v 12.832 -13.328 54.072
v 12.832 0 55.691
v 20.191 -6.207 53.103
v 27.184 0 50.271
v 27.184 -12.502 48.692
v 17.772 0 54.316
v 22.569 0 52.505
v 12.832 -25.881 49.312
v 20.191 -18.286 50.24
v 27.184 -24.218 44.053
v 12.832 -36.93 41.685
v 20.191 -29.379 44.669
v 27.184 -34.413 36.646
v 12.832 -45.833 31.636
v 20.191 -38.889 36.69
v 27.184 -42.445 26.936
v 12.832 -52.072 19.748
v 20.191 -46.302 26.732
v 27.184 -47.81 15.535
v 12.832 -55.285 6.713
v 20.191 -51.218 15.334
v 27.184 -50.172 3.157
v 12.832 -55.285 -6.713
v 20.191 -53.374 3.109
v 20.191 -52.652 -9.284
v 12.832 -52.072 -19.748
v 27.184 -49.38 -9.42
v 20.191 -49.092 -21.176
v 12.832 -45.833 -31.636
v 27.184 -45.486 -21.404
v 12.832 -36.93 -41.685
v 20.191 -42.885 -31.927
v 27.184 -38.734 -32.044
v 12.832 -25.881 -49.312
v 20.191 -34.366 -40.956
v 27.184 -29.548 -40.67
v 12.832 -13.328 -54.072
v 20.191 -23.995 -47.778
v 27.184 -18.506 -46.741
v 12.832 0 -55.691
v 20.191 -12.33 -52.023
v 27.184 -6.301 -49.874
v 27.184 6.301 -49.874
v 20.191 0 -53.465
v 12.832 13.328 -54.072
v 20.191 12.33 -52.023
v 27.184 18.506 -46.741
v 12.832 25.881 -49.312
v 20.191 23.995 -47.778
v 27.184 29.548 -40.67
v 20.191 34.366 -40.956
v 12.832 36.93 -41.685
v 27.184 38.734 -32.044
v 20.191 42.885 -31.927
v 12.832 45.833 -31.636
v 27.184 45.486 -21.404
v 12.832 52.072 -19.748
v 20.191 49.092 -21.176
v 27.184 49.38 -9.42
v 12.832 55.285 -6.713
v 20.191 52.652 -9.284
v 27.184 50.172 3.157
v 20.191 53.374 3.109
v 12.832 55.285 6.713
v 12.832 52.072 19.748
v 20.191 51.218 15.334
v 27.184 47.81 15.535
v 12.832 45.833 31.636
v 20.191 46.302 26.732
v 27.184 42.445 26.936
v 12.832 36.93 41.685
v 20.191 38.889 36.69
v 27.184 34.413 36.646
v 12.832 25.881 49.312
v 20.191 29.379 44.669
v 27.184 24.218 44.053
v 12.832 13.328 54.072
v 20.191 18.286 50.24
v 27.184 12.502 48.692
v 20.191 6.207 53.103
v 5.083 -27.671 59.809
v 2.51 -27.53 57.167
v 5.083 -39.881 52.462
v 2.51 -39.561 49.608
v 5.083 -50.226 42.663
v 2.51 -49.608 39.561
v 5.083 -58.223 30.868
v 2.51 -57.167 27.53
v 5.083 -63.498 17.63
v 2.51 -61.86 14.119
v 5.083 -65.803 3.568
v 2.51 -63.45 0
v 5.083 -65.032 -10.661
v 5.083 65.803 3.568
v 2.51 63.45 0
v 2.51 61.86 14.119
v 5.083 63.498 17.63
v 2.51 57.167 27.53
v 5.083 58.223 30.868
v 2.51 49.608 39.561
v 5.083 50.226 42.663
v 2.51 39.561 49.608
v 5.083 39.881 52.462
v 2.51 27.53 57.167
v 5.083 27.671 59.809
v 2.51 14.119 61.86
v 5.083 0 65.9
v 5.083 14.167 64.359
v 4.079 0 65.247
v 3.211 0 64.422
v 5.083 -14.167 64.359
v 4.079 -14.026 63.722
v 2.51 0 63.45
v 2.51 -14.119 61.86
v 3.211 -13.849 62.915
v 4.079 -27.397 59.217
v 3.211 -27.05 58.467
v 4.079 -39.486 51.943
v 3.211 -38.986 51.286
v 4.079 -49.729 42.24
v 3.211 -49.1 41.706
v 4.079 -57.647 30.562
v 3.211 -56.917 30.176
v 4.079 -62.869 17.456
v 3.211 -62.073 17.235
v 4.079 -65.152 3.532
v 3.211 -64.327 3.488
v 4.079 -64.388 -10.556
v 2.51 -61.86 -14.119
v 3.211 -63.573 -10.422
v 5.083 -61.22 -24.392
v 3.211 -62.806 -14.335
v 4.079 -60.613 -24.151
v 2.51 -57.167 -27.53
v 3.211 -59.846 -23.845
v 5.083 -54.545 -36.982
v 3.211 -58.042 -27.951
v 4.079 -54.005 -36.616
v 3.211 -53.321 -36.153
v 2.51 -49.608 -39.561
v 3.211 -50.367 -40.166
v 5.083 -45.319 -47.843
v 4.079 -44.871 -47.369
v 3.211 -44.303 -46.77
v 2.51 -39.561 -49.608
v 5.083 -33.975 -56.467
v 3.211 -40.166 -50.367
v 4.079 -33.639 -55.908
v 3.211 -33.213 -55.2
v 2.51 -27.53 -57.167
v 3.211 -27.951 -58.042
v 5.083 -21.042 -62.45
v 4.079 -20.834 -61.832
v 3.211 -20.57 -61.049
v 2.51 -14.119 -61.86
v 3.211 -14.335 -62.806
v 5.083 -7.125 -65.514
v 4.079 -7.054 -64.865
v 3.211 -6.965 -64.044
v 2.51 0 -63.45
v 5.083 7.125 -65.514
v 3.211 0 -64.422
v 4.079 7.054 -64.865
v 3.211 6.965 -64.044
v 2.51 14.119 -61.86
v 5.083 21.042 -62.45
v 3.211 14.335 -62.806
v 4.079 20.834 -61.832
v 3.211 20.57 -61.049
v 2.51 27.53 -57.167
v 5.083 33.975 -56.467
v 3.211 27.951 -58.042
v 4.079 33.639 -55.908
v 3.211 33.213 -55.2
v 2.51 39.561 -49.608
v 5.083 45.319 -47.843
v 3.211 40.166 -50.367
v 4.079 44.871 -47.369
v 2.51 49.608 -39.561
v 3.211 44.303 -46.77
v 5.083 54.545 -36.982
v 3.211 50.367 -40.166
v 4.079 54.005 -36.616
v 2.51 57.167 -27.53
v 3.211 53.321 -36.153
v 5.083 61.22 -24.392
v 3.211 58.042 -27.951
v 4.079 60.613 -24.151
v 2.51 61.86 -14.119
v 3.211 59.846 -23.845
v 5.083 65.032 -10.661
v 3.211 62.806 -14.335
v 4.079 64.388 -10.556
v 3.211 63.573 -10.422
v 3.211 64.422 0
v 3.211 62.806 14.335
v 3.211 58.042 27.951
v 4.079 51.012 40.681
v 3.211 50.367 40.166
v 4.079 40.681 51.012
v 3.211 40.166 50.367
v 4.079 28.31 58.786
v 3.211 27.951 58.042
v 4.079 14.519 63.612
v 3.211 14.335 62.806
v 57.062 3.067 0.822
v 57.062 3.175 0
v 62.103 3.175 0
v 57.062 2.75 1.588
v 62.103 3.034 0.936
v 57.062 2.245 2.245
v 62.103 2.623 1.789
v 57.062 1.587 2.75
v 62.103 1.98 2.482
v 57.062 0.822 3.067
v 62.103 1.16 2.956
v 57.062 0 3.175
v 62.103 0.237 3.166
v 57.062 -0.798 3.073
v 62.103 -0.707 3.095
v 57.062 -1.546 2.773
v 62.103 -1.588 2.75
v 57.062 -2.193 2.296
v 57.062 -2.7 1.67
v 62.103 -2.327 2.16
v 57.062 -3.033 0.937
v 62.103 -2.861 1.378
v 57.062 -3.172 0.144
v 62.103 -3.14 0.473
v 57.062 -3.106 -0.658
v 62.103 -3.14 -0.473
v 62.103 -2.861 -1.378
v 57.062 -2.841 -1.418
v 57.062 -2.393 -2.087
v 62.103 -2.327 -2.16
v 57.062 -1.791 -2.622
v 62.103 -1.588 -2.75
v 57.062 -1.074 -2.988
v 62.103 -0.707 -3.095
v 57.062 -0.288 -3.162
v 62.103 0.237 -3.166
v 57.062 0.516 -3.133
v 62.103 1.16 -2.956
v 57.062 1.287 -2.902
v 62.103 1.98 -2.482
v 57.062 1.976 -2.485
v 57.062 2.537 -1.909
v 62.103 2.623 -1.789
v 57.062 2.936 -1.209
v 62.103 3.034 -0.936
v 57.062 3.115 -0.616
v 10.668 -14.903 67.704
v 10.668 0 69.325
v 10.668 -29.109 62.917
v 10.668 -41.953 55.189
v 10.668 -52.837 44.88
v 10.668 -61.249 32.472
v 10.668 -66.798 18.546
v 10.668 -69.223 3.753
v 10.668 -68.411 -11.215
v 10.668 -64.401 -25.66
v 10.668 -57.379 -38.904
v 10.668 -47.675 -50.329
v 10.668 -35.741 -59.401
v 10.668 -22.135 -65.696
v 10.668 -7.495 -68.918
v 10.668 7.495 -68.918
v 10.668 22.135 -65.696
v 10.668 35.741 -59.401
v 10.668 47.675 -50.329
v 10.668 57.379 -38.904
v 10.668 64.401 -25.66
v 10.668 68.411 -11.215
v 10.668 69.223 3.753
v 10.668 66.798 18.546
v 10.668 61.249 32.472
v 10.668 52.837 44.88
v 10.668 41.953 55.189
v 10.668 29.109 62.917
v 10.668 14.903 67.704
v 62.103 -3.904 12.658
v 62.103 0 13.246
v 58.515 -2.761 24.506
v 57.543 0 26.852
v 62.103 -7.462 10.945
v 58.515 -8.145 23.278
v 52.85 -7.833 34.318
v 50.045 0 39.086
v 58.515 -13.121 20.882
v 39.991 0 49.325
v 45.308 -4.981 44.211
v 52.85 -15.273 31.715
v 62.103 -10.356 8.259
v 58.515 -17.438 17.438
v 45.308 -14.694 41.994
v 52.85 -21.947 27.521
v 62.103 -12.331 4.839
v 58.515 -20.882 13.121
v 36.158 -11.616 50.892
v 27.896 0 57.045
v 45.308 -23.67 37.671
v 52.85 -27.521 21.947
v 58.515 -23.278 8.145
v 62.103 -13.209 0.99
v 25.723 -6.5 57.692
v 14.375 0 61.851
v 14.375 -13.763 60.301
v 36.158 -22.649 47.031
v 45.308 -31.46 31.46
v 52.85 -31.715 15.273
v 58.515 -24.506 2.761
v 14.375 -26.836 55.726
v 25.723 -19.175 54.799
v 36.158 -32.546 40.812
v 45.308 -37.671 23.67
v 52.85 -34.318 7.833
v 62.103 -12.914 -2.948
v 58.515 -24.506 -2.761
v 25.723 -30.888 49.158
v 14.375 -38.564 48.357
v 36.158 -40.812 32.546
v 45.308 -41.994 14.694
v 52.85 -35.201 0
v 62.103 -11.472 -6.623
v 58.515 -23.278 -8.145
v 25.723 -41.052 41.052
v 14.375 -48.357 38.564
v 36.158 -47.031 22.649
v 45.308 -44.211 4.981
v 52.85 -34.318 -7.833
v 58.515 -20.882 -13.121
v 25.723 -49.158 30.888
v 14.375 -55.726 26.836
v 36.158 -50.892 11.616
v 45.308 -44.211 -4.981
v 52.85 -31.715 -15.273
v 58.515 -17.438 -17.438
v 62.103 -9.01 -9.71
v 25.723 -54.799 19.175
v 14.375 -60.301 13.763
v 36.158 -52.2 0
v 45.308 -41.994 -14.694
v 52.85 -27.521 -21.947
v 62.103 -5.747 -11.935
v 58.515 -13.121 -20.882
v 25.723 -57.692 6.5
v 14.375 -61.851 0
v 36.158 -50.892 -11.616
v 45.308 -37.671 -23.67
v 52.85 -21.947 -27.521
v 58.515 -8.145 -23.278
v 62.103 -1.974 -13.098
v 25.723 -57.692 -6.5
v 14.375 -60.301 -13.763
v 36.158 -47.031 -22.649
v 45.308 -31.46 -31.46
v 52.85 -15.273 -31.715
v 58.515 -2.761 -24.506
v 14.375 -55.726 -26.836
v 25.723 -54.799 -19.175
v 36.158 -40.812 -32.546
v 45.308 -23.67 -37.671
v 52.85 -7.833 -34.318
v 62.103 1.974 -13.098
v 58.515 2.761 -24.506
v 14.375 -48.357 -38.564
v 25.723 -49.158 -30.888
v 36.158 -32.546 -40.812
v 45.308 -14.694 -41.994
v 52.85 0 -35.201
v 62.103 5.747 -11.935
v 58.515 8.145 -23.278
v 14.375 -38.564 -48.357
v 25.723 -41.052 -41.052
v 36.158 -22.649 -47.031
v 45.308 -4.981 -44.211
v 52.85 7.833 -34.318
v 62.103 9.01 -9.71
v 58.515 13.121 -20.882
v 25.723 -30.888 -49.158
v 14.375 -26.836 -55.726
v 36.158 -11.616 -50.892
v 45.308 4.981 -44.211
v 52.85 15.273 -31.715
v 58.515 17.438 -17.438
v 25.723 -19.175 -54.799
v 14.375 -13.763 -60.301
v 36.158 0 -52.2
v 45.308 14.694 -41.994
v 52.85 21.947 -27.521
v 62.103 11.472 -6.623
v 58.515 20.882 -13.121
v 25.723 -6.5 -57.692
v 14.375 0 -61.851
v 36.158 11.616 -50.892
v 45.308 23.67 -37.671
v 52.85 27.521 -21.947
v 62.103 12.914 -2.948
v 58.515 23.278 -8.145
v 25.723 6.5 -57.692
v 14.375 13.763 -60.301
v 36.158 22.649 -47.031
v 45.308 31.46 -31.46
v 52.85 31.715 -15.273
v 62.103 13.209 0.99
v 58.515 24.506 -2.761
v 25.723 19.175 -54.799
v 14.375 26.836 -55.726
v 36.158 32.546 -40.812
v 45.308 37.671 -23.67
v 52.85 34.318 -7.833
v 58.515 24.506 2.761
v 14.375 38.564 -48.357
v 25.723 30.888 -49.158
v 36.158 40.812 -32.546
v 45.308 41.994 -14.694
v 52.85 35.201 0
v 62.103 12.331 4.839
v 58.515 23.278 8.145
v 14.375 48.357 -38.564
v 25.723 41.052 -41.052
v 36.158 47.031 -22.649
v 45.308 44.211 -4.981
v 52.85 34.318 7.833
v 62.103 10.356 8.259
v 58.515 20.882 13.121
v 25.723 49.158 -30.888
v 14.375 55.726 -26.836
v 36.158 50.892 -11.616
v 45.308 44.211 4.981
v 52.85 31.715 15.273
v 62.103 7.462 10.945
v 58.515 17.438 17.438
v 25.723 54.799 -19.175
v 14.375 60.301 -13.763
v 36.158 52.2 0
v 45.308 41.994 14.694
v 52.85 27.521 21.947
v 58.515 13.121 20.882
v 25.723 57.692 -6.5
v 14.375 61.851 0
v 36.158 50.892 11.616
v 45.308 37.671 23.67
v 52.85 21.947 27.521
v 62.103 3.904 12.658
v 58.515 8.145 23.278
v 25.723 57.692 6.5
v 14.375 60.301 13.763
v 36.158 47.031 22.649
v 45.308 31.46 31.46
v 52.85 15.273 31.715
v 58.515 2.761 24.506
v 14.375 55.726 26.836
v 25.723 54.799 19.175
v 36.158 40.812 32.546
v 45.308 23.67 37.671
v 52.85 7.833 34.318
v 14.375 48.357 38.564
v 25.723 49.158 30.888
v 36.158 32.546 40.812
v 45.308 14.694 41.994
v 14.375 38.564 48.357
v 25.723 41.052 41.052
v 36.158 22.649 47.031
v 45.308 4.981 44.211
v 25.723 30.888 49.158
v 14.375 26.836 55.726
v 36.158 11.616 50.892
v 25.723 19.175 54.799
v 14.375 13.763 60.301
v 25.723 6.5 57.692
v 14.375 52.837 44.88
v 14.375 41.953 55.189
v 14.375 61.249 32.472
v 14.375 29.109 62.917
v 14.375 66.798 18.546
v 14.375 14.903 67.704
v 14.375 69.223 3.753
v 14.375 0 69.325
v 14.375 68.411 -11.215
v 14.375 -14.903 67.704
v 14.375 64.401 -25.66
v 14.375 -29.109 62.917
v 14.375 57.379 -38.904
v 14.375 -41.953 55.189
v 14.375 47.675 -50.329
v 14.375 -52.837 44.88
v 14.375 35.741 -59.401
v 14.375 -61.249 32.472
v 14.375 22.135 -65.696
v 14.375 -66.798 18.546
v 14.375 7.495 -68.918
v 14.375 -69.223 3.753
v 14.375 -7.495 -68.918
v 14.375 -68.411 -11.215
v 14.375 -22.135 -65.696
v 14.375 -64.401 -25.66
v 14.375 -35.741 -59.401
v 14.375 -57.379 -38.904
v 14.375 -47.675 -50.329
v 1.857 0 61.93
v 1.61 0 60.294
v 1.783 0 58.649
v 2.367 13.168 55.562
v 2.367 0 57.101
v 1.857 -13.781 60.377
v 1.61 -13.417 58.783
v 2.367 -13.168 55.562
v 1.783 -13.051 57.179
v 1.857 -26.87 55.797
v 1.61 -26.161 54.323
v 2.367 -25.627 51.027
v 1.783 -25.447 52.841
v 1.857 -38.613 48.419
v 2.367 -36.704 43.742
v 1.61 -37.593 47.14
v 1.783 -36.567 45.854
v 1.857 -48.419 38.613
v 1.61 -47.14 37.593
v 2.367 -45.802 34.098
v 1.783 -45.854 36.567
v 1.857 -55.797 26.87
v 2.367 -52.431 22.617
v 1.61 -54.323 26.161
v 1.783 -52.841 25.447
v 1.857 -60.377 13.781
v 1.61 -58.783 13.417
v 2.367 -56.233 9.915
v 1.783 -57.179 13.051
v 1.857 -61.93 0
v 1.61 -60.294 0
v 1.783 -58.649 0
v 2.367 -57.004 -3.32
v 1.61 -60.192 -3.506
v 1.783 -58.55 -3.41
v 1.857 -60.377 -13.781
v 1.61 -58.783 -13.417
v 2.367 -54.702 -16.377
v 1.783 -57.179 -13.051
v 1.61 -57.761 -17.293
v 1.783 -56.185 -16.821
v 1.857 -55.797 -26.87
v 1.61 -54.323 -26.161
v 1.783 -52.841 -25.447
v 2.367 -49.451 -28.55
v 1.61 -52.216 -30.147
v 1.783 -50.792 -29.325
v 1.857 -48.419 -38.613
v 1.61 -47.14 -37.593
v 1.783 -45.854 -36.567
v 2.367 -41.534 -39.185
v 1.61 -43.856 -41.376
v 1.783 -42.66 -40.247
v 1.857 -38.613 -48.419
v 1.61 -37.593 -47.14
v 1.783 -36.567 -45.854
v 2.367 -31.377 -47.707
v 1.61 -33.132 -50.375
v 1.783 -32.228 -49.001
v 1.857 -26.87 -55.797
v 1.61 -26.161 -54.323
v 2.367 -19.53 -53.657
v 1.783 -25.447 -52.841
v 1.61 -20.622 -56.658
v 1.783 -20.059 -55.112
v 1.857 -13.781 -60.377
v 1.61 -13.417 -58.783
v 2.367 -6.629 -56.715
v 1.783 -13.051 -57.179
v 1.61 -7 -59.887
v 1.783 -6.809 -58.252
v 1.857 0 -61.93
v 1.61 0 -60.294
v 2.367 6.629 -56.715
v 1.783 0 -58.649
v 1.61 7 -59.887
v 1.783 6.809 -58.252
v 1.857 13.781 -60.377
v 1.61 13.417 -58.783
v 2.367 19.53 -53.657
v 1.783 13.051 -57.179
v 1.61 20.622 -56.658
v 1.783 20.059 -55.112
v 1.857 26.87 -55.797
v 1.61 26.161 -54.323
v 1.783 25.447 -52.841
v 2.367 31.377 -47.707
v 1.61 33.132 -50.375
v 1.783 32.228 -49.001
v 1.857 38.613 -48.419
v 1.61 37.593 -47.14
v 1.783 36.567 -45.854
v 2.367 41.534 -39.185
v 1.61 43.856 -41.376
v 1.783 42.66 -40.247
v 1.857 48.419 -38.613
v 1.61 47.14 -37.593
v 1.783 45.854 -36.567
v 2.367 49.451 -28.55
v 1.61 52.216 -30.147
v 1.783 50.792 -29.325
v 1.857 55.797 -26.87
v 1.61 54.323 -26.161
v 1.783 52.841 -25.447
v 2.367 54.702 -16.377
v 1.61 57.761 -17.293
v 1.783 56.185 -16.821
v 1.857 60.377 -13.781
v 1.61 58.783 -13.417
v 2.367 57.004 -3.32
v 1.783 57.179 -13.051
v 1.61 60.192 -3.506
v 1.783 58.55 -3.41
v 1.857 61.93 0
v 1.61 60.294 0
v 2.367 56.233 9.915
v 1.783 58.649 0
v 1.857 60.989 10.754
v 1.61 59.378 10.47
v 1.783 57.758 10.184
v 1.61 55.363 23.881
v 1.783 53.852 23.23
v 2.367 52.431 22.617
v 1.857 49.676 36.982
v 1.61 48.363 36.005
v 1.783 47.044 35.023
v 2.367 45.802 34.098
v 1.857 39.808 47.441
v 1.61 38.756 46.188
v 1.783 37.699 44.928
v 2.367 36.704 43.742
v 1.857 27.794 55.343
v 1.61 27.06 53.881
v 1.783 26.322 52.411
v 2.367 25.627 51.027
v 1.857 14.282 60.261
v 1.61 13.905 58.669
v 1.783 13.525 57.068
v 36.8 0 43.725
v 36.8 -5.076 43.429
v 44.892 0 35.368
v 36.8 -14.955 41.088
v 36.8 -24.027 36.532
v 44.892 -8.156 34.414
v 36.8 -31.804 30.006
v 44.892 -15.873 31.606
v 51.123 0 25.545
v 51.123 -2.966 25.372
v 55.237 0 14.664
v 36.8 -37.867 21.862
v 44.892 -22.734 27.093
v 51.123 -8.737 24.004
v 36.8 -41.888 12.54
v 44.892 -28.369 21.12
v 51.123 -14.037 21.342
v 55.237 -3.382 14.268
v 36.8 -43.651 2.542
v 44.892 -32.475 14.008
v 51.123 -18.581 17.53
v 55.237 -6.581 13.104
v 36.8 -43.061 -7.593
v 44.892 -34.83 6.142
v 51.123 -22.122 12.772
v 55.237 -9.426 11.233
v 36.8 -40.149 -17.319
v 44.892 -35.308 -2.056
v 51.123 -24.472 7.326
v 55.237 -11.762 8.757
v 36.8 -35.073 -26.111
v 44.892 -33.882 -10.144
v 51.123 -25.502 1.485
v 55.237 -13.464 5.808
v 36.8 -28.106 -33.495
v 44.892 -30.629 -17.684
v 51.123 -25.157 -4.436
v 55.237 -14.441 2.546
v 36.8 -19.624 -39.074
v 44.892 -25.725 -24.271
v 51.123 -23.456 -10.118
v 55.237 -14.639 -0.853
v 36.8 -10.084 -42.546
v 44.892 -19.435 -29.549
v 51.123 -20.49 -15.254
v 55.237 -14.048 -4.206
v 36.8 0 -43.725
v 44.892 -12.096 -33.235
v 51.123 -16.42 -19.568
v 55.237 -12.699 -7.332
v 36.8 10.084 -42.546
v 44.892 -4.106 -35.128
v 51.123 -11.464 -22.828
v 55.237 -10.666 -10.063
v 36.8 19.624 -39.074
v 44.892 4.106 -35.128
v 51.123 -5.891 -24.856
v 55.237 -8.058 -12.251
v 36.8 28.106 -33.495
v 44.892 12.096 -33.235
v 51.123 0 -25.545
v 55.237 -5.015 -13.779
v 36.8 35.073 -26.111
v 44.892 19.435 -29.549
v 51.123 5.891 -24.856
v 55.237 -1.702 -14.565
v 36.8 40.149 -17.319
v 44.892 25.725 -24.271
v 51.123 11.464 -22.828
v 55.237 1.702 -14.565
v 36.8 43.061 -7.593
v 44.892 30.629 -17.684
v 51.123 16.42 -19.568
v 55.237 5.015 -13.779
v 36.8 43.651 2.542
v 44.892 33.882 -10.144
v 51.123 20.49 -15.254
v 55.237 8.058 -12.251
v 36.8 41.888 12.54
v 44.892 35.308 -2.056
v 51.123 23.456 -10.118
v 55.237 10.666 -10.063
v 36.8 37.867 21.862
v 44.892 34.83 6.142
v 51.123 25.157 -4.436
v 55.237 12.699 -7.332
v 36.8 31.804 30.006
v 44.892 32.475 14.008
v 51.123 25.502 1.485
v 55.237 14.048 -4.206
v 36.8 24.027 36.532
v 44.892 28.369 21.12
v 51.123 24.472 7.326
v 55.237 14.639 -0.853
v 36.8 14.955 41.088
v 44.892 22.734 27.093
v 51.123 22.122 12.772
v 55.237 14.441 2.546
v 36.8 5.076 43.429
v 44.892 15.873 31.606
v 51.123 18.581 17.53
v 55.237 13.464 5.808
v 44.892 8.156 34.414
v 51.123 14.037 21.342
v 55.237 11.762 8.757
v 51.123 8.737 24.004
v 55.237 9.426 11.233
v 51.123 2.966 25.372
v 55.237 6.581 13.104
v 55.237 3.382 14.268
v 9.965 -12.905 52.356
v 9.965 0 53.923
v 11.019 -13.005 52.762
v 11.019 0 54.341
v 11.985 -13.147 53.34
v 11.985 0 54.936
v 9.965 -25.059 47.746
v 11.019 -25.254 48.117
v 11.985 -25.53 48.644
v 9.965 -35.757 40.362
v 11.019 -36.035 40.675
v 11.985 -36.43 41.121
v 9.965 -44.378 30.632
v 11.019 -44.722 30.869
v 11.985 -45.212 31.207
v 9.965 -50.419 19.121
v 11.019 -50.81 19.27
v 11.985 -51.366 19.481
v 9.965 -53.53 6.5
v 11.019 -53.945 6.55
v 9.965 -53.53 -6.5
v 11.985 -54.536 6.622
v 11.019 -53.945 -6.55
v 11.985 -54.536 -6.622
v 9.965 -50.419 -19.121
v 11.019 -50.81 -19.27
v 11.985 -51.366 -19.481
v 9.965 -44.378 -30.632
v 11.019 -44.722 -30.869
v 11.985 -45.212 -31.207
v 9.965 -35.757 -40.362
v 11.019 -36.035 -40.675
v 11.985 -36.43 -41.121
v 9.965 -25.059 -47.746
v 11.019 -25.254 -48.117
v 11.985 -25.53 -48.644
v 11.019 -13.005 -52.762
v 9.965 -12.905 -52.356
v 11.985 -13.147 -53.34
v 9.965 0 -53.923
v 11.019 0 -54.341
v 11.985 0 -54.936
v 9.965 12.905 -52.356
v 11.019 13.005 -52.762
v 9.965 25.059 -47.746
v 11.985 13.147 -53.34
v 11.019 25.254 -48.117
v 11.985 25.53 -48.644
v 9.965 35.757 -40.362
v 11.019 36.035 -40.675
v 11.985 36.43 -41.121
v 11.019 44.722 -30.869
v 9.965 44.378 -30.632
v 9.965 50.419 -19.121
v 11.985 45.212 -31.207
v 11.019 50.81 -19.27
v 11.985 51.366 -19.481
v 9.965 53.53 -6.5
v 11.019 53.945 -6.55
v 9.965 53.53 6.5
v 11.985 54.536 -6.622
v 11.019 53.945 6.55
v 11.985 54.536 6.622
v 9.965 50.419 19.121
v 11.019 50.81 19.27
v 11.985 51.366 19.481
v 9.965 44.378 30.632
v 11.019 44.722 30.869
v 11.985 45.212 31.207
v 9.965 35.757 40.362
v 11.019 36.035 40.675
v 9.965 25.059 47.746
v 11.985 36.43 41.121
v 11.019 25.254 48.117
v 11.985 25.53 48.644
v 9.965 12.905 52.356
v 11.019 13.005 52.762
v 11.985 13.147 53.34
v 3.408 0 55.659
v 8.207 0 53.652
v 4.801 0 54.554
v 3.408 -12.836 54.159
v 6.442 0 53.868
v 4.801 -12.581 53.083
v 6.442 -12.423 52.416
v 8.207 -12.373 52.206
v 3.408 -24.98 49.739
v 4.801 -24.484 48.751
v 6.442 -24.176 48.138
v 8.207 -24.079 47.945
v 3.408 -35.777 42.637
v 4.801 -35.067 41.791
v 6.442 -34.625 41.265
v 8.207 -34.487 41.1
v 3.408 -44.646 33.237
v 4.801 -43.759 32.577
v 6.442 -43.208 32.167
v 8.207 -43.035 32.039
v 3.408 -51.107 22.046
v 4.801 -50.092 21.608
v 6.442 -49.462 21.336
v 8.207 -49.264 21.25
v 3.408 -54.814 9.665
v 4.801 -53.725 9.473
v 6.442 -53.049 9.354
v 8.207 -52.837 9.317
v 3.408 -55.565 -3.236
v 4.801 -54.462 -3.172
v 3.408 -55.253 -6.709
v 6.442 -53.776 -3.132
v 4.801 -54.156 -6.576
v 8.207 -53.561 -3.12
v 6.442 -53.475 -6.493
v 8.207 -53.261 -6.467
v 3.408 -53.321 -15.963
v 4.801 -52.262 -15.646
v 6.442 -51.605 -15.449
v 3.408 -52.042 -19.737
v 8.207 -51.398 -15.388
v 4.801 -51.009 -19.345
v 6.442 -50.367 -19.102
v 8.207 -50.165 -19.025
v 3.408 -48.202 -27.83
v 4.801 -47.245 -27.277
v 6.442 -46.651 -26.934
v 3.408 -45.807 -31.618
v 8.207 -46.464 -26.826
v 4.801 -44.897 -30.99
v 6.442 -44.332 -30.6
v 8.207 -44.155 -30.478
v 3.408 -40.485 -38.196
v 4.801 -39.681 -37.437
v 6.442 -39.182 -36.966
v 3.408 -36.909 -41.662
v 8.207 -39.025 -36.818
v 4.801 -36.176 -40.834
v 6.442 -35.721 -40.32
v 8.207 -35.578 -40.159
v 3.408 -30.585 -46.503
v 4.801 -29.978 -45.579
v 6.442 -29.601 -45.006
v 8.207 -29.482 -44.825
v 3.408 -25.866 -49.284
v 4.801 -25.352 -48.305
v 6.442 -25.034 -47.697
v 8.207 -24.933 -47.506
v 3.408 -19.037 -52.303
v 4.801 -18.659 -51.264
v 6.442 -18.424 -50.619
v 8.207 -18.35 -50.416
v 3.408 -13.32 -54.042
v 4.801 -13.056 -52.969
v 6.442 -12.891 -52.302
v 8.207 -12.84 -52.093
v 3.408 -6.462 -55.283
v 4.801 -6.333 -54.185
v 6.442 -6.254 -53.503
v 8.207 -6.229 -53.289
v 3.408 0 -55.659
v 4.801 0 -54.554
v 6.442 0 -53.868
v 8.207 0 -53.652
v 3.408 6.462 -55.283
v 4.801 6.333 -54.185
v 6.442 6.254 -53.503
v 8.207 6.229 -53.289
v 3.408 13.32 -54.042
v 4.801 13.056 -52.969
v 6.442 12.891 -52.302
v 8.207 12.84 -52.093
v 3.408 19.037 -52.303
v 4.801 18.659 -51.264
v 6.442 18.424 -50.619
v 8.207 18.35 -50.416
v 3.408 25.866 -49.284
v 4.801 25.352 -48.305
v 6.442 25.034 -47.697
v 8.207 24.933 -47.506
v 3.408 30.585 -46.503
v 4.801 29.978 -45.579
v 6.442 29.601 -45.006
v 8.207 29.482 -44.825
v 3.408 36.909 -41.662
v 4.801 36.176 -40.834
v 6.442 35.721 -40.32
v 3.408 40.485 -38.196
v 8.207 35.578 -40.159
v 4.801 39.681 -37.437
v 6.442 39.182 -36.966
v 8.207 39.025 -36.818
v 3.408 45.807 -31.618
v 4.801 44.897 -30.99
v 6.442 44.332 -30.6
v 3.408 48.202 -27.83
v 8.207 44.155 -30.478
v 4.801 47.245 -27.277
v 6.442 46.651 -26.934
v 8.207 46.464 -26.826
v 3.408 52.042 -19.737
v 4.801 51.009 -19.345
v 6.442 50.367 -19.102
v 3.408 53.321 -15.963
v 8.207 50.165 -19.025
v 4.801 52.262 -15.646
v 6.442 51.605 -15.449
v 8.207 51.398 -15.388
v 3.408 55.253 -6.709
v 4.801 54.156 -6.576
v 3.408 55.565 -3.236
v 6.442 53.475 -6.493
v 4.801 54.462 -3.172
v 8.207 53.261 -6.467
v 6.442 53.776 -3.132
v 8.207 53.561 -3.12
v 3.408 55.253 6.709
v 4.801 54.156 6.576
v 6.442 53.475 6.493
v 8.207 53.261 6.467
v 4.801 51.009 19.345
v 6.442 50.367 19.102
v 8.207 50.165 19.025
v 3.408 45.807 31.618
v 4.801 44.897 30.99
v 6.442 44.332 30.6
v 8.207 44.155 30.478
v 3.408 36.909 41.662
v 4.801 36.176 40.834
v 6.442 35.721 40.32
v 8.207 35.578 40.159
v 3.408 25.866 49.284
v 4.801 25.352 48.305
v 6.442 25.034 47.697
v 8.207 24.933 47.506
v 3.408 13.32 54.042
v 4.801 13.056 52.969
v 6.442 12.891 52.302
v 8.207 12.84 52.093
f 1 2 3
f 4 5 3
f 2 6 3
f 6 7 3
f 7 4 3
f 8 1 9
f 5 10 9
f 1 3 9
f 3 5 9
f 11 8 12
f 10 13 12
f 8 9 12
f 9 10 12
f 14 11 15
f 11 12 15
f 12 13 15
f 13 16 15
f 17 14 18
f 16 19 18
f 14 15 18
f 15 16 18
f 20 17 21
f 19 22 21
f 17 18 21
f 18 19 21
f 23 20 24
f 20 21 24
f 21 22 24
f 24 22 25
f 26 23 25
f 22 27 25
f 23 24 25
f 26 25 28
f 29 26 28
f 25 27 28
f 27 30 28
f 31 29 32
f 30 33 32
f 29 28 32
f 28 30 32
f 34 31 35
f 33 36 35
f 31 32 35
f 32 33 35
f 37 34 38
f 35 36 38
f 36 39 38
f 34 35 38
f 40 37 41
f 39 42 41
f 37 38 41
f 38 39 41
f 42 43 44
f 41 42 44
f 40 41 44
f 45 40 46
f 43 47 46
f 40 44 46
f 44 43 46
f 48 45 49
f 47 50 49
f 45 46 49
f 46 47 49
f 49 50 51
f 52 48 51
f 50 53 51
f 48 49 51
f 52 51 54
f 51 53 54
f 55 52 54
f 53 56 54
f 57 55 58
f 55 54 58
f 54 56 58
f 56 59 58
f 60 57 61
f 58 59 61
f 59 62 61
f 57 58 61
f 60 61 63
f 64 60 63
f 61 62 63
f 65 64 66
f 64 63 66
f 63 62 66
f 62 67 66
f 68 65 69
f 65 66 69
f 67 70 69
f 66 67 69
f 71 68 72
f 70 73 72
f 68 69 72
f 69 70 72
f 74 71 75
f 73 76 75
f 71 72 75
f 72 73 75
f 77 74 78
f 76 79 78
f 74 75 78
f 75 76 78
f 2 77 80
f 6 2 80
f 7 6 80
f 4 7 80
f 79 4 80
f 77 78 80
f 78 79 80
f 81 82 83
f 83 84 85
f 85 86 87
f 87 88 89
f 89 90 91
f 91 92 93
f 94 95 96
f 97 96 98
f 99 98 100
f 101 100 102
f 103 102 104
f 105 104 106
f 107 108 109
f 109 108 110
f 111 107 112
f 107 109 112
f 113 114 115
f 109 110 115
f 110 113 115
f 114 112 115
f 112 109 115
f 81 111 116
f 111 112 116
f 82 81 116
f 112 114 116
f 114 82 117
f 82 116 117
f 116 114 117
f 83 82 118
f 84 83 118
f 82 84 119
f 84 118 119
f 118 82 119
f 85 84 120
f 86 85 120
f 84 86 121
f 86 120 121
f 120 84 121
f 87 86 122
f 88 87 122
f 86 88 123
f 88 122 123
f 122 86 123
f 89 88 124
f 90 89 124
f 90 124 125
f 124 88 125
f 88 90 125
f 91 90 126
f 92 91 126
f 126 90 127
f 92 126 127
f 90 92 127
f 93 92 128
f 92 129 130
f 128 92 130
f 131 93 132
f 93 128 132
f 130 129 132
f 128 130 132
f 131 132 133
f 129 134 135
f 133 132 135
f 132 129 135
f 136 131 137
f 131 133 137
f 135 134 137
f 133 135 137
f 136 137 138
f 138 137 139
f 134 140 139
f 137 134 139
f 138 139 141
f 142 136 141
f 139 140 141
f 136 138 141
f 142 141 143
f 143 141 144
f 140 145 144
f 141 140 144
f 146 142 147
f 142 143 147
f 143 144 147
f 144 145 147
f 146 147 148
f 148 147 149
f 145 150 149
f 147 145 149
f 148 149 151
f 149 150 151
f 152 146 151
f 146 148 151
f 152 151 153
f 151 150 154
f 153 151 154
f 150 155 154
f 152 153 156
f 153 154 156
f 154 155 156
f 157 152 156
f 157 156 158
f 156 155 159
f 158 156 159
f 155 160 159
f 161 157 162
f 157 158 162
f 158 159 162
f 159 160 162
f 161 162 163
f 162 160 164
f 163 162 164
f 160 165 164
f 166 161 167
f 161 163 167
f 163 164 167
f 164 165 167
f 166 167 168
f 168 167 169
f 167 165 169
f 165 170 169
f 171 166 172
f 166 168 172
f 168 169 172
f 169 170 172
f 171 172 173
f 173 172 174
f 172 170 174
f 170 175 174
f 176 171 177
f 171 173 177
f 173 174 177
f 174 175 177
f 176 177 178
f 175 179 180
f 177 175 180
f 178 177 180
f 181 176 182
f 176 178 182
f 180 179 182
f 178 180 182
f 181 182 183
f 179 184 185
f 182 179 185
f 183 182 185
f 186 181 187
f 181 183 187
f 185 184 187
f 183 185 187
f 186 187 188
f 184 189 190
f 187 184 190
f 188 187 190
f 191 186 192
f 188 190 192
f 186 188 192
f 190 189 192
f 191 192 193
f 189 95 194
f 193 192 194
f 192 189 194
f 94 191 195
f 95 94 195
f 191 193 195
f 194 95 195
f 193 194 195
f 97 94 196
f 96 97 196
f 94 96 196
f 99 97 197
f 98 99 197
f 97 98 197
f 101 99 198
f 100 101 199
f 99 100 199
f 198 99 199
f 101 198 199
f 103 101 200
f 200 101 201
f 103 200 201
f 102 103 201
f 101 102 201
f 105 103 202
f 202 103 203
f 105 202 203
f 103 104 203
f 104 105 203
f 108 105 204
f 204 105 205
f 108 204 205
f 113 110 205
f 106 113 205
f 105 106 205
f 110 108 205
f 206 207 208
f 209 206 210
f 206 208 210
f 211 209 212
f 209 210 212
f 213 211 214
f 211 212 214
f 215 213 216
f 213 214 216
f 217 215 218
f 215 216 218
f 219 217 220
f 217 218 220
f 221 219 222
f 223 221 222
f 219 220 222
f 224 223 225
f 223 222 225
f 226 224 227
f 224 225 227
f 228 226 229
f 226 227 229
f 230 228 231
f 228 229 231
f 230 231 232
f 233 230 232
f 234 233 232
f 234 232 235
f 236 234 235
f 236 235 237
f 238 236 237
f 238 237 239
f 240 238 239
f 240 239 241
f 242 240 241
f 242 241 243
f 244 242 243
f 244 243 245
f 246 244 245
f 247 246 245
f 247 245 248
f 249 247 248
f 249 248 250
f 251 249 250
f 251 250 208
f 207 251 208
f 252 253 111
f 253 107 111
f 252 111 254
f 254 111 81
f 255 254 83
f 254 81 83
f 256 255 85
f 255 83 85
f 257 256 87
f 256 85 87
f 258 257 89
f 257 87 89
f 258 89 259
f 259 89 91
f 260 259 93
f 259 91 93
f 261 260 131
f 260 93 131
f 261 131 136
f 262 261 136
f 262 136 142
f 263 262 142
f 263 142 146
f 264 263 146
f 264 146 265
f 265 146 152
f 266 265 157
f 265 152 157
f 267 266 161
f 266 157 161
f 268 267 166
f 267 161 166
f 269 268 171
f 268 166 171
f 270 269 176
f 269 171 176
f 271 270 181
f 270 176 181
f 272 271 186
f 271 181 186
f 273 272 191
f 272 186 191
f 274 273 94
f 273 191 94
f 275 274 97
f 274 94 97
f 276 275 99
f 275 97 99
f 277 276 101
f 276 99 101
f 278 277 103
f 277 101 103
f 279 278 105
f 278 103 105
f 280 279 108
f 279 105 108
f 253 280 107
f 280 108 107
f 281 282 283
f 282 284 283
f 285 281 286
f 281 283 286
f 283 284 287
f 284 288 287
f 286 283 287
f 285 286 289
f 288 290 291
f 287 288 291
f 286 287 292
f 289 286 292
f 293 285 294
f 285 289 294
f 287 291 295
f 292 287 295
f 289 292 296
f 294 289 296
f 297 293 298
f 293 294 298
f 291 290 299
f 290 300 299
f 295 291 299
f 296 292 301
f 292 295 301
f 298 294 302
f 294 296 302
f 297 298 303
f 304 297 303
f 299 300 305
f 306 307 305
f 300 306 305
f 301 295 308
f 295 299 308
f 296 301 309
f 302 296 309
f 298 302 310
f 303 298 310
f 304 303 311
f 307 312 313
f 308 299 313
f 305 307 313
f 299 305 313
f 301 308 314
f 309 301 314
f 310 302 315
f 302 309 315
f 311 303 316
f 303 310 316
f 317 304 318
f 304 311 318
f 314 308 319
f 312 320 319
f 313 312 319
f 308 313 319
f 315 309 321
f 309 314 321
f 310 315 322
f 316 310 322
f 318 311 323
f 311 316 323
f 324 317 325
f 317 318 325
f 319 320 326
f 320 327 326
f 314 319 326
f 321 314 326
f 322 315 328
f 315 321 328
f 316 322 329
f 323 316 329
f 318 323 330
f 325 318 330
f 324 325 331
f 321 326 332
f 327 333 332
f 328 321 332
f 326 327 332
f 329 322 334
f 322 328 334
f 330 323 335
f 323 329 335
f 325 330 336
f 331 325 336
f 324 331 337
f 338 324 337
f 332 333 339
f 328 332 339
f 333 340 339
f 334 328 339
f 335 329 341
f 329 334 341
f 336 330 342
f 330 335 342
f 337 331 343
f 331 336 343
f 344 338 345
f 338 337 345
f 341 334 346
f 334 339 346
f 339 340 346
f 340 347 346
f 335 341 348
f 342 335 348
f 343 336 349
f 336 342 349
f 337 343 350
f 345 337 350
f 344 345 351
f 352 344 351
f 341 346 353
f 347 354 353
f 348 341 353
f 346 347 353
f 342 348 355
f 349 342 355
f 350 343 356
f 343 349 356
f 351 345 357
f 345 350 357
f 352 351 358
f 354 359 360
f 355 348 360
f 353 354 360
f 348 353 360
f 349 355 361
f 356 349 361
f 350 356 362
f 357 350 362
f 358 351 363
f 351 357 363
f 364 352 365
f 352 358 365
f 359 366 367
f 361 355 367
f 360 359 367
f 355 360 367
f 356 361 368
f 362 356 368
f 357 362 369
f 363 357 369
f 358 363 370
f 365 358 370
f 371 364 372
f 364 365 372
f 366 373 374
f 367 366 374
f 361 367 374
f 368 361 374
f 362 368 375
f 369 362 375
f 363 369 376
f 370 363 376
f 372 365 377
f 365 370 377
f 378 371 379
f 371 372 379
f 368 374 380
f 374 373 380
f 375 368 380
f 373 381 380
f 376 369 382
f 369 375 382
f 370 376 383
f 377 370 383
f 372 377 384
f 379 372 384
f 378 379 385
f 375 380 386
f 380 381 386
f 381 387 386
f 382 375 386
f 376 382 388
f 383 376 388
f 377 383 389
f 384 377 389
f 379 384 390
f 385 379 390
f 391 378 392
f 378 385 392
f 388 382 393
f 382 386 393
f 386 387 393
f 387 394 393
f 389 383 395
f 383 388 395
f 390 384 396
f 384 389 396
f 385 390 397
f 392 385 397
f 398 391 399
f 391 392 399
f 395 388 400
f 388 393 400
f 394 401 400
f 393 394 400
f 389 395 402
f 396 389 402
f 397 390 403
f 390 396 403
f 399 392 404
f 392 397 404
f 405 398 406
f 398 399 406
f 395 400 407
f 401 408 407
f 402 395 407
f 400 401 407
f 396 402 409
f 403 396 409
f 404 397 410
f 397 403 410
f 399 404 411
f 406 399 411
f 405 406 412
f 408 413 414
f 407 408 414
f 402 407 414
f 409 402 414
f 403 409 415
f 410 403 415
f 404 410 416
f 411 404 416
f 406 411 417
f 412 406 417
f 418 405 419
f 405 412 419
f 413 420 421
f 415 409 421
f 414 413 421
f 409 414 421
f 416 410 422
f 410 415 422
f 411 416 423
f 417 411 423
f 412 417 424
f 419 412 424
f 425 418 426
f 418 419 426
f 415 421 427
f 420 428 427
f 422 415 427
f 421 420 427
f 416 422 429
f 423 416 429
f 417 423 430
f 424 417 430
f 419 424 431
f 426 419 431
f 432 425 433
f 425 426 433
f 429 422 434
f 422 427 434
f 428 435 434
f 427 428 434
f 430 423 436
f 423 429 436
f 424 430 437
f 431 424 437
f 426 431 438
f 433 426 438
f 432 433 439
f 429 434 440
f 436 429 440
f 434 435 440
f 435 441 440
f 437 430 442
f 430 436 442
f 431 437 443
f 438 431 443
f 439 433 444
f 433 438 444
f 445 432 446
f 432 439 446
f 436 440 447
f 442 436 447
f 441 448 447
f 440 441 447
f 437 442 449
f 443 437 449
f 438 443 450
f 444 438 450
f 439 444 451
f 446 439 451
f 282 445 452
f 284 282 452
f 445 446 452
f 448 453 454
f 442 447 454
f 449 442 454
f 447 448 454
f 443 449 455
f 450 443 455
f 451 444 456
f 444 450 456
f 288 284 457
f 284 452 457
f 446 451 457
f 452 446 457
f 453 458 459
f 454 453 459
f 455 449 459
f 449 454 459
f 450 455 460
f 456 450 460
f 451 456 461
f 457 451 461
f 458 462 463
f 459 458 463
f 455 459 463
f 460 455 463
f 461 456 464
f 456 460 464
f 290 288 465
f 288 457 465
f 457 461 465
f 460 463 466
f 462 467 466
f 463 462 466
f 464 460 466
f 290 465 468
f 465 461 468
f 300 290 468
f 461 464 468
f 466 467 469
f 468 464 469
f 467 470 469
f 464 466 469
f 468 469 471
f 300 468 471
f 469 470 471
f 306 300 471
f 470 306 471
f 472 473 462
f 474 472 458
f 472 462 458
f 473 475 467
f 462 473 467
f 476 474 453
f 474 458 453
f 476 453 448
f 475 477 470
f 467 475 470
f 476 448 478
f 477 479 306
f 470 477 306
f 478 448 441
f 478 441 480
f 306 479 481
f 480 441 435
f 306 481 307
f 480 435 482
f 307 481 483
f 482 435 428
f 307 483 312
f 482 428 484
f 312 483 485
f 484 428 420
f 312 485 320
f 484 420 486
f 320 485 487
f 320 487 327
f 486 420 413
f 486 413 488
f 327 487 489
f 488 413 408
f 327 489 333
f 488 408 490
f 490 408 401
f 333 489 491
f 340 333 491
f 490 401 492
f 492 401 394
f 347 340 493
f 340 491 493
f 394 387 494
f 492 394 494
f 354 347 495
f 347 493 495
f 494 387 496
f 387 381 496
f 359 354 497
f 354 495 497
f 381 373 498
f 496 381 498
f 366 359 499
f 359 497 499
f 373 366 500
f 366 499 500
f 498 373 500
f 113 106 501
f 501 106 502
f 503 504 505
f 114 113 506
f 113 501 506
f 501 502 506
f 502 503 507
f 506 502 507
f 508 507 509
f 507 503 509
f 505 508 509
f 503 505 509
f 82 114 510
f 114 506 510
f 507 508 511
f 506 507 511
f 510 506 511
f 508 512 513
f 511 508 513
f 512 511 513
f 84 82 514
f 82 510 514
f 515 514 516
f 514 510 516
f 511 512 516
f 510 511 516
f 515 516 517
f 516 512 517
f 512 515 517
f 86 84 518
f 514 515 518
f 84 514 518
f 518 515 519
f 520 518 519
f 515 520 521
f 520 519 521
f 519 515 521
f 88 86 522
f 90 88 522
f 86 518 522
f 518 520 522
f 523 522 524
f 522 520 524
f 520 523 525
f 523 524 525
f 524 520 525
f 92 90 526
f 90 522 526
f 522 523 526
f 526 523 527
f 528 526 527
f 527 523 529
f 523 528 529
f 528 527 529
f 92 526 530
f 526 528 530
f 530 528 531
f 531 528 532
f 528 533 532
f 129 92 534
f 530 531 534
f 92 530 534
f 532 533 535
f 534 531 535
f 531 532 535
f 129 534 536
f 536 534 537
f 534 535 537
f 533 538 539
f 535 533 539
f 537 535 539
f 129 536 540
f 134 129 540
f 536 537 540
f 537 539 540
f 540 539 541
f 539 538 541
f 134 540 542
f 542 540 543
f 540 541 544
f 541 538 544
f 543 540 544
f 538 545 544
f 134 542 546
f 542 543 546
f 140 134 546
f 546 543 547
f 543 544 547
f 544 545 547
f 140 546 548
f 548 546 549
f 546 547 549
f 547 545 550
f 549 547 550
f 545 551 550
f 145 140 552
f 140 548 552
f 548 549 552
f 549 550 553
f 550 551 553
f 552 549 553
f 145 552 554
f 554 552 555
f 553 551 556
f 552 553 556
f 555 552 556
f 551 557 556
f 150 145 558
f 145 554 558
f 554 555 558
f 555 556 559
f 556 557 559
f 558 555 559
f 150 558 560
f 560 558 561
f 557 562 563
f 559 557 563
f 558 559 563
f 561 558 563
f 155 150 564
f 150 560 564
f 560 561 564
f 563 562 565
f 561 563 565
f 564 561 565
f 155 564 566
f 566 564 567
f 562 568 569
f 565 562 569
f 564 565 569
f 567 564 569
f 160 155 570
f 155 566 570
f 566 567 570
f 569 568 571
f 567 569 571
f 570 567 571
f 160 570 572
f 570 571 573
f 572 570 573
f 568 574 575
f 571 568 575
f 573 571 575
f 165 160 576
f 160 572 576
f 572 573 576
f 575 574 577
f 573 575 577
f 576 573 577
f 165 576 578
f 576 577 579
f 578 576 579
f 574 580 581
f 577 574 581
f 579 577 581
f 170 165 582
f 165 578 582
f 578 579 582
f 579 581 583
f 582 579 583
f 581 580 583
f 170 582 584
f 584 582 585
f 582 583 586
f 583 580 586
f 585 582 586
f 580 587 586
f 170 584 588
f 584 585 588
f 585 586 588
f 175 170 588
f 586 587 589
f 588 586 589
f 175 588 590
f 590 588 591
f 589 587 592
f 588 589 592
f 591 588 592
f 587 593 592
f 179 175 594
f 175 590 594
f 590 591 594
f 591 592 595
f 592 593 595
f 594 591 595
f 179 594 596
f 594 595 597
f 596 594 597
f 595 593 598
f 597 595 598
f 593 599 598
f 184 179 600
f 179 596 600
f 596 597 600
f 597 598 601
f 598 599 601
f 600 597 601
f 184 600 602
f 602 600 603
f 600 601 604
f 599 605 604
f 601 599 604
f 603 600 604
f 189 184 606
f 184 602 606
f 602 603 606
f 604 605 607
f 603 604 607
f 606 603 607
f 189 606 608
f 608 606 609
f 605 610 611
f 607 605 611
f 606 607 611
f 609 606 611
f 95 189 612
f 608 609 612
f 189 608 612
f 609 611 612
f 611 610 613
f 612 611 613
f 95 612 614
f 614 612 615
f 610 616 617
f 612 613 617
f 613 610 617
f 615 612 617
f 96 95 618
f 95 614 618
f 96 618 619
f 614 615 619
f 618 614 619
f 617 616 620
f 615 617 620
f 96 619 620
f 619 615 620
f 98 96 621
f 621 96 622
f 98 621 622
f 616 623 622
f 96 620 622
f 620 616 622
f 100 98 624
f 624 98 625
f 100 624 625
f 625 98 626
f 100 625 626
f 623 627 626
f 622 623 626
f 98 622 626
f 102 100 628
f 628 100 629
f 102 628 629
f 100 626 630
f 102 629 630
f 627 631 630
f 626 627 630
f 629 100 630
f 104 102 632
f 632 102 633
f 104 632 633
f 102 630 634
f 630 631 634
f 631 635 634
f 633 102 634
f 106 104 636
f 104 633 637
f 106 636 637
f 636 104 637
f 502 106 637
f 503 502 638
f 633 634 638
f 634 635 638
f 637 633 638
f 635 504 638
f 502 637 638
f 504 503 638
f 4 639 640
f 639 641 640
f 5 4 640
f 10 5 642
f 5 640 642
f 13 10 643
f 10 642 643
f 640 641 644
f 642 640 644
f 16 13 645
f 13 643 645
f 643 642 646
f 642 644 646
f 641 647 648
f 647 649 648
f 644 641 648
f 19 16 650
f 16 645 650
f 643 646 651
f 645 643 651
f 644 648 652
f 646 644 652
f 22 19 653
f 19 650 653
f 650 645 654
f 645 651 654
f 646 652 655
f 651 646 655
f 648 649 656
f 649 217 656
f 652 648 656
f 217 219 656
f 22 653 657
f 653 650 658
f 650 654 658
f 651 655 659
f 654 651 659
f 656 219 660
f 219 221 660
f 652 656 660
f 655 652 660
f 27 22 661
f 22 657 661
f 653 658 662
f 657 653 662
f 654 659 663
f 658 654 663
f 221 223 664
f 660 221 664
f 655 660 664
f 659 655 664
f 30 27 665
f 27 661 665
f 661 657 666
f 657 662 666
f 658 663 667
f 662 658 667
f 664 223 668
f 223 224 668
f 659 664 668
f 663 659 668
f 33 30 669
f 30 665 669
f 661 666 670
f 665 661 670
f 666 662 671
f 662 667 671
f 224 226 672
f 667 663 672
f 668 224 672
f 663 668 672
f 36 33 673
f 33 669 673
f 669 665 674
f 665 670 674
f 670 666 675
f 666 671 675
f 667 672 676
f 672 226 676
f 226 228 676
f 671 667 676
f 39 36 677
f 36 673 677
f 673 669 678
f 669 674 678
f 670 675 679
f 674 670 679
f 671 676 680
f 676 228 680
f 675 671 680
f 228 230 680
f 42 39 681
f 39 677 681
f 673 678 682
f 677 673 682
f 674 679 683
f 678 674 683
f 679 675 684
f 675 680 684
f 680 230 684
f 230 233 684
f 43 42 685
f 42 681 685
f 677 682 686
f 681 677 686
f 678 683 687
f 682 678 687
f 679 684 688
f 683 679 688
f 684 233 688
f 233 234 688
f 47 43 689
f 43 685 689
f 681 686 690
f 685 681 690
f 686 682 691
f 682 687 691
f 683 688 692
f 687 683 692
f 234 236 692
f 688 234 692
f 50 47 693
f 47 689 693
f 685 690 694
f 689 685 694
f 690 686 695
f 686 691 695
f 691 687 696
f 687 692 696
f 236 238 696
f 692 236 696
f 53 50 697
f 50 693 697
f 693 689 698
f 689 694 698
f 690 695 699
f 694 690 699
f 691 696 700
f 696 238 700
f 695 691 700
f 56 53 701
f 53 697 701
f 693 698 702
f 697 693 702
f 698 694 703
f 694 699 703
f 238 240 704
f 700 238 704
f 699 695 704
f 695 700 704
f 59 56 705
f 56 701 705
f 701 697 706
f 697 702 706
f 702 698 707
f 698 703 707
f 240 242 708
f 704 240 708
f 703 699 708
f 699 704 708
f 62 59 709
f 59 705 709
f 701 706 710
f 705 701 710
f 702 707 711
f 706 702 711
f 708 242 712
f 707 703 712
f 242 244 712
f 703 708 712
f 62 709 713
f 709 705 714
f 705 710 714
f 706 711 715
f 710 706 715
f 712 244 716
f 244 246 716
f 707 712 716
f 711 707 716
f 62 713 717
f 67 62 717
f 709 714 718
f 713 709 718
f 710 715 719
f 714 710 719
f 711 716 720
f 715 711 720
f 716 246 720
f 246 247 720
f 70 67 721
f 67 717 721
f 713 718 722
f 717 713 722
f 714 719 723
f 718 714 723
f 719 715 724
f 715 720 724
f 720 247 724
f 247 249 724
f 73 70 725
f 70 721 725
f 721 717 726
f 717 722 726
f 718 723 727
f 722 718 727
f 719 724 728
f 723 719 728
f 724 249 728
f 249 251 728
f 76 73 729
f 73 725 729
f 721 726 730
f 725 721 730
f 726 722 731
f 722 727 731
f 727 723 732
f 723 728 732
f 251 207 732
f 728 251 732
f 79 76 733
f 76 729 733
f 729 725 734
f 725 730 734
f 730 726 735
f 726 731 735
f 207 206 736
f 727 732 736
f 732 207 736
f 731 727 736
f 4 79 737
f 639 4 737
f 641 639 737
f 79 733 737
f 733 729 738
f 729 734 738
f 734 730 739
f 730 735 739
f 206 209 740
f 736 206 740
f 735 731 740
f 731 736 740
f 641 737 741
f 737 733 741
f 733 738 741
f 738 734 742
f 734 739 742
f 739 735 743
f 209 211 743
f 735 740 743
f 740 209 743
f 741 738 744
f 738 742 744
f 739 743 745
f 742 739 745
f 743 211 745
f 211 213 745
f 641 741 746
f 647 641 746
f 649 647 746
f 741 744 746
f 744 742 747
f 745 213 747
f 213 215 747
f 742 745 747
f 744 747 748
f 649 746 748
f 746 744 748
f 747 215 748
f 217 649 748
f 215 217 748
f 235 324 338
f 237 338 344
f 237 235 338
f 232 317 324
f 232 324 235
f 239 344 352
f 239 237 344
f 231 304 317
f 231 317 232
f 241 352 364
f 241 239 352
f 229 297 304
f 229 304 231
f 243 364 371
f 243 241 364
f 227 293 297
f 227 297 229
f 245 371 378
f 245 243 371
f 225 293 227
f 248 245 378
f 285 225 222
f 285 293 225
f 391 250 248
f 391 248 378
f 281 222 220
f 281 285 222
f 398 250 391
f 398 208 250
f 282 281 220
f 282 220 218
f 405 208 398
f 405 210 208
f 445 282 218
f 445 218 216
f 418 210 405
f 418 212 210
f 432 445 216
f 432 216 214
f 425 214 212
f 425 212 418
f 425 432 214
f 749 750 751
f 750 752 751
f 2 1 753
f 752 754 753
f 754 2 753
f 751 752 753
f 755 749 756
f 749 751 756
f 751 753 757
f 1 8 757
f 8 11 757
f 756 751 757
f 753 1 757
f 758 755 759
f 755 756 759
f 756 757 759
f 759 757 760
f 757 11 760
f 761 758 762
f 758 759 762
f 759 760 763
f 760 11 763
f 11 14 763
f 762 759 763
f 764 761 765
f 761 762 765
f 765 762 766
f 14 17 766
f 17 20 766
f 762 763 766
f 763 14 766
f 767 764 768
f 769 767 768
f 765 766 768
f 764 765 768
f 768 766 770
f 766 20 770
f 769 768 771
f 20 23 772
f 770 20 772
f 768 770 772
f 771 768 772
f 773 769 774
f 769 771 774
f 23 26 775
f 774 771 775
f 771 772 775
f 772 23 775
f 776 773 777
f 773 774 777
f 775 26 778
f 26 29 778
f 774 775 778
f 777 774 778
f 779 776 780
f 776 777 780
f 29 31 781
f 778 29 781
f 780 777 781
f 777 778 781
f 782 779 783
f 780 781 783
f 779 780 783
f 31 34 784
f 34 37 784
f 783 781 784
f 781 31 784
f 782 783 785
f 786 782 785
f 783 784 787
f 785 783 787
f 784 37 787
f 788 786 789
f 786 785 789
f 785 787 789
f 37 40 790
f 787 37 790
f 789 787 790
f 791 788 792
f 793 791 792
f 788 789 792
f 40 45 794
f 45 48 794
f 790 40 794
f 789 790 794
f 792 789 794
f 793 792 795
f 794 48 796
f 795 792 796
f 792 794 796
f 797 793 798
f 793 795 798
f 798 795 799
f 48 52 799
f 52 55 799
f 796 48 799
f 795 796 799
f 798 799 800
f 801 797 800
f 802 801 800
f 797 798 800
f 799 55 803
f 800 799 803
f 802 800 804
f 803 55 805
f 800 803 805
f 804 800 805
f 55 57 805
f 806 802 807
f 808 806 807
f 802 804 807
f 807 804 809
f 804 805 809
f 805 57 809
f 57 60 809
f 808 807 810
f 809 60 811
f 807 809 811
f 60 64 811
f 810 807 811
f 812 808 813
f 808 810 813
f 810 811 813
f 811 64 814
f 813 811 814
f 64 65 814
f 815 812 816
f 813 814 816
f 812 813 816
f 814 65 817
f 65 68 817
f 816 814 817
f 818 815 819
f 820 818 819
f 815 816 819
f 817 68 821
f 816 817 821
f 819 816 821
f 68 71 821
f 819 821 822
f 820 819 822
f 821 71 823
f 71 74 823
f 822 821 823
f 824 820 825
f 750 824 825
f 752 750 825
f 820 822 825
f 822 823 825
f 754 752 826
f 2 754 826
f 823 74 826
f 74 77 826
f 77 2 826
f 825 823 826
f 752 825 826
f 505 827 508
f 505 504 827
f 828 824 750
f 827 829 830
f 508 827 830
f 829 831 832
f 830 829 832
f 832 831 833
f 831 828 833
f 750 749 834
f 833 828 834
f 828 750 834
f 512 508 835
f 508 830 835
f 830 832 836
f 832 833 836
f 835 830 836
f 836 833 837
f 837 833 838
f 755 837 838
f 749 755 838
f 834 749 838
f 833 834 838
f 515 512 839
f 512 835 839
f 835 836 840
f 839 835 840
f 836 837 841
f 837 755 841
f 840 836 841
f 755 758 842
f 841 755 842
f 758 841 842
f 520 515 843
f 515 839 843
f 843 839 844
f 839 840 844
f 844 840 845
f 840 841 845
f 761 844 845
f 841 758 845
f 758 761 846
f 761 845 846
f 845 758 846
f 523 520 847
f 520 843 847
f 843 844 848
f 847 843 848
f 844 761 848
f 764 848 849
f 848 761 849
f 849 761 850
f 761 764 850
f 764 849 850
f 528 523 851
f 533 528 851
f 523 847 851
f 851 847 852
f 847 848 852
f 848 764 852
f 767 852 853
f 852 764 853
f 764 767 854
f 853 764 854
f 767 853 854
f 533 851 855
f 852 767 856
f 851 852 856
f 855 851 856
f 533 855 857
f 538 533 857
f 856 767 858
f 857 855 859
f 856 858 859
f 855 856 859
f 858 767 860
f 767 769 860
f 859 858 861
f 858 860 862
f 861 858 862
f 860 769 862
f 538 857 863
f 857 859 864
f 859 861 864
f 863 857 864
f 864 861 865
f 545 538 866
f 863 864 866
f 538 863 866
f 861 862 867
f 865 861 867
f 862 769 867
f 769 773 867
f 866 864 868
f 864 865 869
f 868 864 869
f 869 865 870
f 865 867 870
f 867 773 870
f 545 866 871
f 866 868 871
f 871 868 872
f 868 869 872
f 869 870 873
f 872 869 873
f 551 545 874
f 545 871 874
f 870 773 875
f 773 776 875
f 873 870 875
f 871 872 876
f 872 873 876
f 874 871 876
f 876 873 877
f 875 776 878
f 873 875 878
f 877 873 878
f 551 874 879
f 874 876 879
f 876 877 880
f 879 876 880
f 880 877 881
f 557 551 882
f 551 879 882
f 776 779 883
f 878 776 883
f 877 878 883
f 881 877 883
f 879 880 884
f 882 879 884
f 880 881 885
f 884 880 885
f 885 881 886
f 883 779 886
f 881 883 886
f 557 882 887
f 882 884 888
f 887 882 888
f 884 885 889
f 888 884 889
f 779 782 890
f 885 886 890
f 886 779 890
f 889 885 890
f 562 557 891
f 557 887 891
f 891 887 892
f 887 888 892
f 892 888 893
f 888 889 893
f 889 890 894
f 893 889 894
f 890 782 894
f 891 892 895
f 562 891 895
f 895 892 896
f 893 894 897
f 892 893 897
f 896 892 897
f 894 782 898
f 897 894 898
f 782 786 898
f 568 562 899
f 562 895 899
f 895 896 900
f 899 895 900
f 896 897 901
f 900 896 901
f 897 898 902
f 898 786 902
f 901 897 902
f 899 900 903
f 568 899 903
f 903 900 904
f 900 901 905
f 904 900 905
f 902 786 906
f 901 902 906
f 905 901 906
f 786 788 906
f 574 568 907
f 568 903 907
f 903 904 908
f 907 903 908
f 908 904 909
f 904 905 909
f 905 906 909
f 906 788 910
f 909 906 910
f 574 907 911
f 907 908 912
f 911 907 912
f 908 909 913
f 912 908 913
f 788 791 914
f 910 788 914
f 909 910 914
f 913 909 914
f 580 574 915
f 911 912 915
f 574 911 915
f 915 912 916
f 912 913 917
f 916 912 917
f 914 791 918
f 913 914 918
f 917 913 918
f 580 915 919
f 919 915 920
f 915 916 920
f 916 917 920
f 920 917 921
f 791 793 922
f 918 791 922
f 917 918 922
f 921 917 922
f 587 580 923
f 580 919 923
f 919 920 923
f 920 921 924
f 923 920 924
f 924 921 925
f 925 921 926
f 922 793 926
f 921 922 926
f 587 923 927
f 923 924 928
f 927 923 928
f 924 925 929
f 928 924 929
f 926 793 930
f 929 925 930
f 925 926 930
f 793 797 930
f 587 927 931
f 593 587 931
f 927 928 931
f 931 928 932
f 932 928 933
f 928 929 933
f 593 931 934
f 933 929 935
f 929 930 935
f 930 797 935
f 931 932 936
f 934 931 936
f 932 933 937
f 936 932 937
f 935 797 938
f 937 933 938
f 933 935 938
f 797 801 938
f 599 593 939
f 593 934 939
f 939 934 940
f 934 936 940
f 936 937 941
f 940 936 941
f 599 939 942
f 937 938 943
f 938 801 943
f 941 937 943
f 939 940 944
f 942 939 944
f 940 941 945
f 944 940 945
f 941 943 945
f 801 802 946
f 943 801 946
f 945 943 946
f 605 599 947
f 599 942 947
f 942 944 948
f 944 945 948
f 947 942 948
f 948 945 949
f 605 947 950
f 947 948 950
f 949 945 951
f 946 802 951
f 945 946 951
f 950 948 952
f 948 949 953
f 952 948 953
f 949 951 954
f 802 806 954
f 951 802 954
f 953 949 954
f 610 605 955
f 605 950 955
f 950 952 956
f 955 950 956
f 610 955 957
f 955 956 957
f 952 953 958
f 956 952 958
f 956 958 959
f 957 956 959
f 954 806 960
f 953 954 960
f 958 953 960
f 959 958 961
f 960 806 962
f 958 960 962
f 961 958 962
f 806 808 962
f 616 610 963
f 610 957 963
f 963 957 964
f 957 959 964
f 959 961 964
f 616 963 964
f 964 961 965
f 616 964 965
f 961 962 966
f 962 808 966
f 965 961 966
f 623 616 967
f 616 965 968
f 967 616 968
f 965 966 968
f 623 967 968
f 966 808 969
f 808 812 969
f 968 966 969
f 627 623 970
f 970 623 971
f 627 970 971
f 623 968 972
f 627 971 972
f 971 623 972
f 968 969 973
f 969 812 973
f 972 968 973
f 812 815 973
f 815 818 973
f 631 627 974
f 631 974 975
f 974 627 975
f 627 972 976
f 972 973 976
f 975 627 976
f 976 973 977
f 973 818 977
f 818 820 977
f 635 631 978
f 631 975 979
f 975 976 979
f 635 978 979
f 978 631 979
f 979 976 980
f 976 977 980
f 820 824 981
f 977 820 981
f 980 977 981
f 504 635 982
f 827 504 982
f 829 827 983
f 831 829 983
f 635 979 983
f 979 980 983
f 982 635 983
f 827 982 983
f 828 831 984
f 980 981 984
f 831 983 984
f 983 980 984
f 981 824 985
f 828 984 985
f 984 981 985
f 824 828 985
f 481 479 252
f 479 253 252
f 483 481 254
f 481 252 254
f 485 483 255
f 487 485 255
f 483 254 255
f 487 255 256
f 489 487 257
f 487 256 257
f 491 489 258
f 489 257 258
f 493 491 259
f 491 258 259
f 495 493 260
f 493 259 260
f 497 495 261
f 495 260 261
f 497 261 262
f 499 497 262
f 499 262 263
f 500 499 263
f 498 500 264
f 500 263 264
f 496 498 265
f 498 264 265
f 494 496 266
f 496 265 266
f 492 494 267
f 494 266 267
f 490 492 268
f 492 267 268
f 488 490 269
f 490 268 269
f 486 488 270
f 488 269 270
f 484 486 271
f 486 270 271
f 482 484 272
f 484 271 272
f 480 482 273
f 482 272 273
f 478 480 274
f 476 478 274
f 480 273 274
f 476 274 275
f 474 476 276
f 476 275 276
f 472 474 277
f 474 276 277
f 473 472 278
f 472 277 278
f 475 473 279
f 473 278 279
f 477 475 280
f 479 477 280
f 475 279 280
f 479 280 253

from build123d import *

# Parameters (mm, degrees)
F3_R     = 3.175
F4_DEPTH = 25.4
F3_R_2   = 13.462
F5_DEPTH = 9.017


with BuildPart() as f1:
    # F0 (on Front) → F1 (revolve)
    with BuildSketch(Plane.XZ):
        with BuildLine():
            Line((57.15, 0), (63.5, 0))
            ThreePointArc((63.5, 0), (49.7246437823, 39.4931614425), (14.3752818669, 61.8514451832))
            ThreePointArc((14.3752818669, 61.8514451832), (14.545447186, 61.0073776147), (14.6025029863, 60.1482205093))
            ThreePointArc((14.6025029863, 60.1482205093), (14.1437492907, 57.7501426695), (12.8322714456, 55.6907111604))
            ThreePointArc((12.8322714456, 55.6907111604), (20.1907637916, 53.46452616), (27.1838868177, 50.270854354))
            ThreePointArc((27.1838868177, 50.270854354), (49.0901295152, 29.2622911643), (57.15, 0))
        make_face()
        with BuildLine():
            ThreePointArc((14.6025029863, 60.1482205093), (14.545447186, 61.0073776147), (14.3752818669, 61.8514451832))
            ThreePointArc((14.3752818669, 61.8514451832), (8.4803191689, 62.9311861226), (2.5098197969, 63.4503806497))
            ThreePointArc((2.5098197969, 63.4503806497), (1.6097384582, 60.2943080474), (2.3670190255, 57.1009607707))
            ThreePointArc((2.3670190255, 57.1009607707), (7.632287252, 56.6380675103), (12.8322714456, 55.6907111604))
            ThreePointArc((12.8322714456, 55.6907111604), (14.1437492907, 57.7501426695), (14.6025029863, 60.1482205093))
        make_face()
        with BuildLine():
            ThreePointArc((12.8322714456, 55.6907111604), (7.632287252, 56.6380675103), (2.3670190255, 57.1009607707))
            ThreePointArc((2.3670190255, 57.1009607707), (5.5979999661, 54.1542983084), (9.9647443416, 53.9227792702))
            ThreePointArc((9.9647443416, 53.9227792702), (11.5150820885, 54.6176657234), (12.8322714456, 55.6907111604))
        make_face()
        with BuildLine():
            ThreePointArc((5.0834796416, 65.8999384363), (10.7005286229, 66.1045985568), (14.3752818669, 61.8514451832))
            Line((14.3752818669, 61.8514451832), (14.3752818669, 69.3246647716))
            Line((14.3752818669, 69.3246647716), (10.6675541028, 69.3246647716))
            Line((10.6675541028, 69.3246647716), (5.0834796416, 65.8999384363))
        make_face()
        with BuildLine():
            ThreePointArc((2.5098197969, 63.4503806497), (8.4803191689, 62.9311861226), (14.3752818669, 61.8514451832))
            ThreePointArc((14.3752818669, 61.8514451832), (10.7005286229, 66.1045985568), (5.0834796416, 65.8999384363))
            ThreePointArc((5.0834796416, 65.8999384363), (3.6259528632, 64.8545044217), (2.5098197969, 63.4503806497))
        make_face()
    revolve(axis=Axis((31.75, 0, 0), (1, 0, 0)))

    # F3 (on offset) → F4 (cut)
    with BuildSketch(Plane.YZ.offset(71.12)):
        Circle(F3_R)
    extrude(amount=-F4_DEPTH, mode=Mode.SUBTRACT)

    # F3 (on offset) → F5 (cut)
    with BuildSketch(Plane.YZ.offset(71.12)):
        Circle(F3_R_2)
        Circle(F3_R, mode=Mode.SUBTRACT)
    extrude(amount=-F5_DEPTH, mode=Mode.SUBTRACT)


solid = f1.part
